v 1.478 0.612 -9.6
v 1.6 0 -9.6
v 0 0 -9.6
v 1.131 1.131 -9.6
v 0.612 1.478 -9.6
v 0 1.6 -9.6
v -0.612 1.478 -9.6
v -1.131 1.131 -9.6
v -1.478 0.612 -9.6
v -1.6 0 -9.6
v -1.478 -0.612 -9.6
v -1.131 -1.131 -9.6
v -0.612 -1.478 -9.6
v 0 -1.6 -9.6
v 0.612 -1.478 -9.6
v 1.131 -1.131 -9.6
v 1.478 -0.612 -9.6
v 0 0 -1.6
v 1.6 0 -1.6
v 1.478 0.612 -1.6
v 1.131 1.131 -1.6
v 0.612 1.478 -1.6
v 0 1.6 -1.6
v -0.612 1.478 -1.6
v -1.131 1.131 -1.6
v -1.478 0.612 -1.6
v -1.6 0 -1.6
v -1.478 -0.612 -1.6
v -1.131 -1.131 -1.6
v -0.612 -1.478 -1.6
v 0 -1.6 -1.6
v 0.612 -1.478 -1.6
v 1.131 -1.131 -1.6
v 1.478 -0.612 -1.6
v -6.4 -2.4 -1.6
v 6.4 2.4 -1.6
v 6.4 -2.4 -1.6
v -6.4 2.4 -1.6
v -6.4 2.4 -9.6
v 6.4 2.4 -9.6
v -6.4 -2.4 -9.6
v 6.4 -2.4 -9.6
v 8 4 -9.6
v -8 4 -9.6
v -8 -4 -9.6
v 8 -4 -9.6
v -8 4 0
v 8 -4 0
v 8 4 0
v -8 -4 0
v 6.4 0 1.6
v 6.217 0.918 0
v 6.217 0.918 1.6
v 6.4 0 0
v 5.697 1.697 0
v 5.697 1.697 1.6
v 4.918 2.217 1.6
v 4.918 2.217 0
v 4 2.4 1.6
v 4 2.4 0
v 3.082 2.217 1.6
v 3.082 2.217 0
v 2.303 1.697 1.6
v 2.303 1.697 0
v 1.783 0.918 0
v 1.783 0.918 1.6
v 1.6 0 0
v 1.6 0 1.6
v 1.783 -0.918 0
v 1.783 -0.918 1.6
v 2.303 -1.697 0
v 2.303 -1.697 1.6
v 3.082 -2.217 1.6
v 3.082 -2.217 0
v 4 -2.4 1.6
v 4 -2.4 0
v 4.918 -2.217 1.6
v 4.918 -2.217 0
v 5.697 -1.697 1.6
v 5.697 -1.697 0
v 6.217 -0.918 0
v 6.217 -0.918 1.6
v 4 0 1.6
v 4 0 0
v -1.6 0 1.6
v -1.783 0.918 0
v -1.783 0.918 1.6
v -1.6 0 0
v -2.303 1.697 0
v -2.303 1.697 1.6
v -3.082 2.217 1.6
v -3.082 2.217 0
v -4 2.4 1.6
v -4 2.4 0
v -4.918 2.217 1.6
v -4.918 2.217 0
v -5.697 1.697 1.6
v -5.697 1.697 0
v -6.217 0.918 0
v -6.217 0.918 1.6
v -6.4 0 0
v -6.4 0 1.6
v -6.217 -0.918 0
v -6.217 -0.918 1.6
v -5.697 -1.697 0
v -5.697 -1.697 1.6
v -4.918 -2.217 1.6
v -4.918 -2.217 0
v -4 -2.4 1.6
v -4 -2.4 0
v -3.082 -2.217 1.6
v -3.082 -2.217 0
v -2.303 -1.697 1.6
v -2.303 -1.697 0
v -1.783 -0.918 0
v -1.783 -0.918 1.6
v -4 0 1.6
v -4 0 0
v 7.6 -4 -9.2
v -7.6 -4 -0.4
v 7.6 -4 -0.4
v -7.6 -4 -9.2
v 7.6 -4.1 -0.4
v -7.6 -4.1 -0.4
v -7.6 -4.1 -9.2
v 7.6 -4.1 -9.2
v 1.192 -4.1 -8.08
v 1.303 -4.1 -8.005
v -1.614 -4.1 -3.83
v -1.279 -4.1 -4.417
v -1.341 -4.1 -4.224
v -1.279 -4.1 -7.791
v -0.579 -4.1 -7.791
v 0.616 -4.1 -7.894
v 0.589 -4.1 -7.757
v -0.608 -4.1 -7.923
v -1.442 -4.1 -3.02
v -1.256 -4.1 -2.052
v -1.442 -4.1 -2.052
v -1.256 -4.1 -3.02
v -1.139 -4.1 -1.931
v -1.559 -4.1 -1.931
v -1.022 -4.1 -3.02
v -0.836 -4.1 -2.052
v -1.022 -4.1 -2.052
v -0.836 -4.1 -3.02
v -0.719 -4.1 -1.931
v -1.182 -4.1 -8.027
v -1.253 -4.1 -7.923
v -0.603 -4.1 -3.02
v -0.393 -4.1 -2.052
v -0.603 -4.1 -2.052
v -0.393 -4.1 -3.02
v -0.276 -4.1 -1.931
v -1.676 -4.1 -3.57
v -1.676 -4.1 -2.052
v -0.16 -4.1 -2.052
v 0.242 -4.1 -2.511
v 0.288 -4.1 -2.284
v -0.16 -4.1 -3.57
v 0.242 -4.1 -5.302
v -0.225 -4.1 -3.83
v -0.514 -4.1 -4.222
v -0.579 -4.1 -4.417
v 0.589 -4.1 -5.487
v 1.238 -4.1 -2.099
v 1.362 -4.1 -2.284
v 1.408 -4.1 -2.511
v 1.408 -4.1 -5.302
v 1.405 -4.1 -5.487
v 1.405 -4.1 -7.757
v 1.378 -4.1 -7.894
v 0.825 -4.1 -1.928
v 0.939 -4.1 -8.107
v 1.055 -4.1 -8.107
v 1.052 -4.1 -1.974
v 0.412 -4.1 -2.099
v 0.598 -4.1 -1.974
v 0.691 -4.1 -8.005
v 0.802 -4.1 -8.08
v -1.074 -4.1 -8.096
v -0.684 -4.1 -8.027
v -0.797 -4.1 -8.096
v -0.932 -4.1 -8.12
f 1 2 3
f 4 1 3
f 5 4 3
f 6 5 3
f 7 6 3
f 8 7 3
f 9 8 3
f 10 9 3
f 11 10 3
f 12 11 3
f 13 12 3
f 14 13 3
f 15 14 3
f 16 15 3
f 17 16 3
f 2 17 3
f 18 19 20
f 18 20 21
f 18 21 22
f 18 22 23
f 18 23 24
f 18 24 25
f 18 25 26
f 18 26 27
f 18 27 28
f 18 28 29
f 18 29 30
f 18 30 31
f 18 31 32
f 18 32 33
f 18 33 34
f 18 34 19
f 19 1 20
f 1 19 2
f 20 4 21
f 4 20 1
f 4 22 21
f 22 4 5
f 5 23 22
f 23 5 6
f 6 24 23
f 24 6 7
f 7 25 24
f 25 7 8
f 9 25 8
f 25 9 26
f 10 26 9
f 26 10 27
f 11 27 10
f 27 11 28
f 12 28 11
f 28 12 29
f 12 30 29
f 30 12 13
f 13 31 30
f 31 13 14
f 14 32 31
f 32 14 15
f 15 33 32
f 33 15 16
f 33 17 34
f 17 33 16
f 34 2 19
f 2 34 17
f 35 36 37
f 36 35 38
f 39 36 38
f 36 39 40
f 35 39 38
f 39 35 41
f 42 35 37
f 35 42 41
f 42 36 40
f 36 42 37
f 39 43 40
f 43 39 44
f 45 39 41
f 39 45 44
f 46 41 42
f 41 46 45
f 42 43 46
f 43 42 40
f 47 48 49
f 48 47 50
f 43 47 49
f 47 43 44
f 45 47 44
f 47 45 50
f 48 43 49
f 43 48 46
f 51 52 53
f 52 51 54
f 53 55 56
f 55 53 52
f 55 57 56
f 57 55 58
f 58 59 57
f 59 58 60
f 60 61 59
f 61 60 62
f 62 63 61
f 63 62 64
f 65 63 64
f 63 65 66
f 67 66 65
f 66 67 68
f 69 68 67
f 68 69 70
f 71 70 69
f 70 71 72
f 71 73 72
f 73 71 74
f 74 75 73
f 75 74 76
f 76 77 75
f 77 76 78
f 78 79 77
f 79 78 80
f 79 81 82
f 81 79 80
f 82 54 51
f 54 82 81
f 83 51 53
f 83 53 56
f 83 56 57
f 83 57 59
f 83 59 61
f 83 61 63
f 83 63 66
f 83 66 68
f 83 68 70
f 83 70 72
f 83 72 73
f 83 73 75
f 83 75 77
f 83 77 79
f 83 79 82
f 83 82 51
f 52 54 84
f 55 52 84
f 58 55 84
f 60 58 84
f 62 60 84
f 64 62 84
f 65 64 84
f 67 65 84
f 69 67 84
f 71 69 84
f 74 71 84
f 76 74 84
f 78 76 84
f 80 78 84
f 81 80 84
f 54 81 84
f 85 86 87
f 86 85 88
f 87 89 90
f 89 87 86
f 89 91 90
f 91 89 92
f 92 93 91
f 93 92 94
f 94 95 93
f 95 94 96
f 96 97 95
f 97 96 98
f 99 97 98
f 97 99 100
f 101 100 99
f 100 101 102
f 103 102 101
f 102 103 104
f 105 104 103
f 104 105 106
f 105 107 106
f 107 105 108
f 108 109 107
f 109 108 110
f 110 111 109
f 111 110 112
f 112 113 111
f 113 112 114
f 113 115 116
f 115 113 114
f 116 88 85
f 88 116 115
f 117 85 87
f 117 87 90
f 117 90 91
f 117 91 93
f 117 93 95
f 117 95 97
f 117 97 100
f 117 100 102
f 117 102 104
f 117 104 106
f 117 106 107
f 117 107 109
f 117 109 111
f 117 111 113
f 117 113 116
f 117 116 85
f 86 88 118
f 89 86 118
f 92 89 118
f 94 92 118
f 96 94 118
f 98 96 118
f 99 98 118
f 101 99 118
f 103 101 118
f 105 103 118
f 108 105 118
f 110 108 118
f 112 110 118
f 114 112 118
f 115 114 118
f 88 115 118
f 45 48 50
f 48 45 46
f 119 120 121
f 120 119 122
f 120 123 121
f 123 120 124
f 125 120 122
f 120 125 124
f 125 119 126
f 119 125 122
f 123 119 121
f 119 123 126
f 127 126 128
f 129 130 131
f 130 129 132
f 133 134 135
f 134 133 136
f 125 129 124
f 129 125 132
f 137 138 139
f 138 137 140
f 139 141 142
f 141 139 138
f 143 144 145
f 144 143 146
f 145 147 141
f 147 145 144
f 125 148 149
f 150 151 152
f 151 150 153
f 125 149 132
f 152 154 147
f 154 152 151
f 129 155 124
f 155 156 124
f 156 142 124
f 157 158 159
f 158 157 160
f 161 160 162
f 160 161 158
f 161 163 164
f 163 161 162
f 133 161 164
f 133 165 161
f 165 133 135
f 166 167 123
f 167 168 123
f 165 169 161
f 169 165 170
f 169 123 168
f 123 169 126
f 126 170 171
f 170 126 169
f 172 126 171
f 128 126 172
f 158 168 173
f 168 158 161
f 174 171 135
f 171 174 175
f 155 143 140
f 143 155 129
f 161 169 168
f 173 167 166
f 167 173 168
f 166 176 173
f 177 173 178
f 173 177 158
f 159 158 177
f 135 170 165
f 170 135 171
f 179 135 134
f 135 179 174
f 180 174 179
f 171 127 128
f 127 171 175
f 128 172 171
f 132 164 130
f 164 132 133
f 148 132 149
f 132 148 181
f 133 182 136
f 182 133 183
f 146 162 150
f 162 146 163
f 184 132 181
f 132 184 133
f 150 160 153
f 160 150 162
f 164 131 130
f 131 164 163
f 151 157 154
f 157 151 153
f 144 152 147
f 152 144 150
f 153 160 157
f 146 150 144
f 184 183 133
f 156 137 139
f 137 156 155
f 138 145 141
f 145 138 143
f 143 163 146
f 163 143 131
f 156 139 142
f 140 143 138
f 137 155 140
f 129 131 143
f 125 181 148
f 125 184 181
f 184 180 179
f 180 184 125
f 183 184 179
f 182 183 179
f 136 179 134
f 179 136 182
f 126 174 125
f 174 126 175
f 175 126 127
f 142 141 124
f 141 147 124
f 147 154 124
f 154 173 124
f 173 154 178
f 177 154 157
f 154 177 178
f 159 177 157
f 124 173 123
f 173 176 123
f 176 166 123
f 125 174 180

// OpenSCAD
// file: ../p/4-4edge.scad
use <../lib.scad>
function ldraw_lib__4_4edge() = [
// 0 Circle 1.0
// 0 Name: 4-4edge.dat
// 0 Author: James Jessiman
// 0 !LDRAW_ORG Primitive UPDATE 2017-01
// 0 !LICENSE Licensed under CC BY 2.0 and CC BY 4.0 : see CAreadme.txt
// 
// 0 BFC CERTIFY CCW
  [0,"BFC","CERTIFY"],
  [0,"BFC","CCW"],
// 
// 0 !HISTORY 1998-12-15 [PTadmin] Official Update 1998-10
// 0 !HISTORY 2005-12-28 [PTadmin] Official Update 2005-01
// 0 !HISTORY 2007-06-24 [PTadmin] Header formatted for Contributor Agreement
// 0 !HISTORY 2008-07-01 [PTadmin] Official Update 2008-01
// 0 !HISTORY 2017-01-15 [Steffen] BFCed
// 0 !HISTORY 2017-12-30 [PTadmin] Official Update 2017-01
// 
// 
// 2 24 1 0 0 0.9239 0 0.3827
  [2,24,1,0,0,0.9239,0,0.3827],
// 2 24 0.9239 0 0.3827 0.7071 0 0.7071
  [2,24,0.9239,0,0.3827,0.7071,0,0.7071],
// 2 24 0.7071 0 0.7071 0.3827 0 0.9239
  [2,24,0.7071,0,0.7071,0.3827,0,0.9239],
// 2 24 0.3827 0 0.9239 0 0 1
  [2,24,0.3827,0,0.9239,0,0,1],
// 2 24 0 0 1 -0.3827 0 0.9239
  [2,24,0,0,1,-0.3827,0,0.9239],
// 2 24 -0.3827 0 0.9239 -0.7071 0 0.7071
  [2,24,-0.3827,0,0.9239,-0.7071,0,0.7071],
// 2 24 -0.7071 0 0.7071 -0.9239 0 0.3827
  [2,24,-0.7071,0,0.7071,-0.9239,0,0.3827],
// 2 24 -0.9239 0 0.3827 -1 0 -0
  [2,24,-0.9239,0,0.3827,-1,0,-0],
// 2 24 -1 0 -0 -0.9239 0 -0.3827
  [2,24,-1,0,-0,-0.9239,0,-0.3827],
// 2 24 -0.9239 0 -0.3827 -0.7071 0 -0.7071
  [2,24,-0.9239,0,-0.3827,-0.7071,0,-0.7071],
// 2 24 -0.7071 0 -0.7071 -0.3827 0 -0.9239
  [2,24,-0.7071,0,-0.7071,-0.3827,0,-0.9239],
// 2 24 -0.3827 0 -0.9239 0 0 -1
  [2,24,-0.3827,0,-0.9239,0,0,-1],
// 2 24 0 0 -1 0.3827 0 -0.9239
  [2,24,0,0,-1,0.3827,0,-0.9239],
// 2 24 0.3827 0 -0.9239 0.7071 0 -0.7071
  [2,24,0.3827,0,-0.9239,0.7071,0,-0.7071],
// 2 24 0.7071 0 -0.7071 0.9239 0 -0.3827
  [2,24,0.7071,0,-0.7071,0.9239,0,-0.3827],
// 2 24 0.9239 0 -0.3827 1 0 0
  [2,24,0.9239,0,-0.3827,1,0,0],
];
module ldraw_lib__4_4edge(step=0, col=false, unit=2/5, alt=false, line=0.2, solid=!$preview)
    makepoly(ldraw_lib__4_4edge(), step=step, col=col, unit=unit, alt=alt, line=line, solid=solid);
ldraw_lib__4_4edge(line=0.2);
// file: ../p/4-4disc.scad
use <../lib.scad>
function ldraw_lib__4_4disc() = [
// 0 Disc 1.0
// 0 Name: 4-4disc.dat
// 0 Author: James Jessiman
// 0 !LDRAW_ORG Primitive UPDATE 2002-02
// 0 !LICENSE Licensed under CC BY 2.0 and CC BY 4.0 : see CAreadme.txt
// 
// 0 BFC CERTIFY CCW
  [0,"BFC","CERTIFY"],
  [0,"BFC","CCW"],
// 
// 0 !HISTORY 1998-12-15 [PTadmin] Official Update 1998-10
// 0 !HISTORY 2002-03-23 [sbliss] Added BFC statement
// 0 !HISTORY 2002-04-25 [PTadmin] Official Update 2002-02
// 0 !HISTORY 2007-06-24 [PTadmin] Header formatted for Contributor Agreement
// 0 !HISTORY 2008-07-01 [PTadmin] Official Update 2008-01
// 
// 
// 3 16 0 0 0 1 0 0 0.9239 0 0.3827
  [3,16,0,0,0,1,0,0,0.9239,0,0.3827],
// 3 16 0 0 0 0.9239 0 0.3827 0.7071 0 0.7071
  [3,16,0,0,0,0.9239,0,0.3827,0.7071,0,0.7071],
// 3 16 0 0 0 0.7071 0 0.7071 0.3827 0 0.9239
  [3,16,0,0,0,0.7071,0,0.7071,0.3827,0,0.9239],
// 3 16 0 0 0 0.3827 0 0.9239 0 0 1
  [3,16,0,0,0,0.3827,0,0.9239,0,0,1],
// 3 16 0 0 0 0 0 1 -0.3827 0 0.9239
  [3,16,0,0,0,0,0,1,-0.3827,0,0.9239],
// 3 16 0 0 0 -0.3827 0 0.9239 -0.7071 0 0.7071
  [3,16,0,0,0,-0.3827,0,0.9239,-0.7071,0,0.7071],
// 3 16 0 0 0 -0.7071 0 0.7071 -0.9239 0 0.3827
  [3,16,0,0,0,-0.7071,0,0.7071,-0.9239,0,0.3827],
// 3 16 0 0 0 -0.9239 0 0.3827 -1 0 -0
  [3,16,0,0,0,-0.9239,0,0.3827,-1,0,-0],
// 3 16 0 0 0 -1 0 -0 -0.9239 0 -0.3827
  [3,16,0,0,0,-1,0,-0,-0.9239,0,-0.3827],
// 3 16 0 0 0 -0.9239 0 -0.3827 -0.7071 0 -0.7071
  [3,16,0,0,0,-0.9239,0,-0.3827,-0.7071,0,-0.7071],
// 3 16 0 0 0 -0.7071 0 -0.7071 -0.3827 0 -0.9239
  [3,16,0,0,0,-0.7071,0,-0.7071,-0.3827,0,-0.9239],
// 3 16 0 0 0 -0.3827 0 -0.9239 0 0 -1
  [3,16,0,0,0,-0.3827,0,-0.9239,0,0,-1],
// 3 16 0 0 0 0 0 -1 0.3827 0 -0.9239
  [3,16,0,0,0,0,0,-1,0.3827,0,-0.9239],
// 3 16 0 0 0 0.3827 0 -0.9239 0.7071 0 -0.7071
  [3,16,0,0,0,0.3827,0,-0.9239,0.7071,0,-0.7071],
// 3 16 0 0 0 0.7071 0 -0.7071 0.9239 0 -0.3827
  [3,16,0,0,0,0.7071,0,-0.7071,0.9239,0,-0.3827],
// 3 16 0 0 0 0.9239 0 -0.3827 1 0 0
  [3,16,0,0,0,0.9239,0,-0.3827,1,0,0],
// 0
];
module ldraw_lib__4_4disc(step=0, col=false, unit=2/5, alt=false, line=0.2, solid=!$preview)
    makepoly(ldraw_lib__4_4disc(), step=step, col=col, unit=unit, alt=alt, line=line, solid=solid);
ldraw_lib__4_4disc(line=0.2);
// file: ../p/4-4cyli.scad
use <../lib.scad>
$fa=1; $fs=0.2;
function ldraw_lib__4_4cyli(realsolid=false) = [
// 0 Cylinder 1.0
// 0 Name: 4-4cyli.dat
// 0 Author: James Jessiman
// 0 !LDRAW_ORG Primitive UPDATE 2005-01
// 0 !LICENSE Licensed under CC BY 2.0 and CC BY 4.0 : see CAreadme.txt
// 
// 0 BFC CERTIFY CCW
  [0,"BFC","CERTIFY"],
  [0,"BFC","CCW"],
// 
// 0 !HISTORY 1998-12-15 [PTadmin] Official Update 1998-10
// 0 !HISTORY 2002-03-23 [sbliss] Added BFC statement; merged headers from files in distributions LDraw 0.27 and Complete.
// 0 !HISTORY 2002-04-25 [PTadmin] Official Update 2002-02
// 0 !HISTORY 2004-12-14 [guyvivan] BFC CCW
// 0 !HISTORY 2005-12-28 [PTadmin] Official Update 2005-01
// 0 !HISTORY 2007-06-24 [PTadmin] Header formatted for Contributor Agreement
// 0 !HISTORY 2008-07-01 [PTadmin] Official Update 2008-01
// 
// 
// 4 16 1 1 0 0.9239 1 0.3827 0.9239 0 0.3827 1 0 0
  [4,16,1,1,0,0.9239,1,0.3827,0.9239,0,0.3827,1,0,0],
// 5 24 1 0 0 1 1 0 0.9239 0 0.3827 0.9239 0 -0.3827
  [5,24,1,0,0,1,1,0,0.9239,0,0.3827,0.9239,0,-0.3827],
// 4 16 0.9239 1 0.3827 0.7071 1 0.7071 0.7071 0 0.7071 0.9239 0 0.3827
  [4,16,0.9239,1,0.3827,0.7071,1,0.7071,0.7071,0,0.7071,0.9239,0,0.3827],
// 5 24 0.9239 0 0.3827 0.9239 1 0.3827 0.7071 0 0.7071 1 0 0
  [5,24,0.9239,0,0.3827,0.9239,1,0.3827,0.7071,0,0.7071,1,0,0],
// 4 16 0.7071 1 0.7071 0.3827 1 0.9239 0.3827 0 0.9239 0.7071 0 0.7071
  [4,16,0.7071,1,0.7071,0.3827,1,0.9239,0.3827,0,0.9239,0.7071,0,0.7071],
// 5 24 0.7071 0 0.7071 0.7071 1 0.7071 0.3827 0 0.9239 0.9239 0 0.3827
  [5,24,0.7071,0,0.7071,0.7071,1,0.7071,0.3827,0,0.9239,0.9239,0,0.3827],
// 4 16 0.3827 1 0.9239 0 1 1 0 0 1 0.3827 0 0.9239
  [4,16,0.3827,1,0.9239,0,1,1,0,0,1,0.3827,0,0.9239],
// 5 24 0.3827 0 0.9239 0.3827 1 0.9239 0 0 1 0.7071 0 0.7071
  [5,24,0.3827,0,0.9239,0.3827,1,0.9239,0,0,1,0.7071,0,0.7071],
// 4 16 0 1 1 -0.3827 1 0.9239 -0.3827 0 0.9239 0 0 1
  [4,16,0,1,1,-0.3827,1,0.9239,-0.3827,0,0.9239,0,0,1],
// 5 24 0 0 1 0 1 1 -0.3827 0 0.9239 0.3827 0 0.9239
  [5,24,0,0,1,0,1,1,-0.3827,0,0.9239,0.3827,0,0.9239],
// 4 16 -0.3827 1 0.9239 -0.7071 1 0.7071 -0.7071 0 0.7071 -0.3827 0 0.9239
  [4,16,-0.3827,1,0.9239,-0.7071,1,0.7071,-0.7071,0,0.7071,-0.3827,0,0.9239],
// 5 24 -0.3827 0 0.9239 -0.3827 1 0.9239 -0.7071 0 0.7071 0 0 1
  [5,24,-0.3827,0,0.9239,-0.3827,1,0.9239,-0.7071,0,0.7071,0,0,1],
// 4 16 -0.7071 1 0.7071 -0.9239 1 0.3827 -0.9239 0 0.3827 -0.7071 0 0.7071
  [4,16,-0.7071,1,0.7071,-0.9239,1,0.3827,-0.9239,0,0.3827,-0.7071,0,0.7071],
// 5 24 -0.7071 0 0.7071 -0.7071 1 0.7071 -0.9239 0 0.3827 -0.3827 0 0.9239
  [5,24,-0.7071,0,0.7071,-0.7071,1,0.7071,-0.9239,0,0.3827,-0.3827,0,0.9239],
// 4 16 -0.9239 1 0.3827 -1 1 0 -1 0 0 -0.9239 0 0.3827
  [4,16,-0.9239,1,0.3827,-1,1,0,-1,0,0,-0.9239,0,0.3827],
// 5 24 -0.9239 0 0.3827 -0.9239 1 0.3827 -1 0 0 -0.7071 0 0.7071
  [5,24,-0.9239,0,0.3827,-0.9239,1,0.3827,-1,0,0,-0.7071,0,0.7071],
// 4 16 -1 1 0 -0.9239 1 -0.3827 -0.9239 0 -0.3827 -1 0 0
  [4,16,-1,1,0,-0.9239,1,-0.3827,-0.9239,0,-0.3827,-1,0,0],
// 5 24 -1 0 0 -1 1 0 -0.9239 0 -0.3827 -0.9239 0 0.3827
  [5,24,-1,0,0,-1,1,0,-0.9239,0,-0.3827,-0.9239,0,0.3827],
// 4 16 -0.9239 1 -0.3827 -0.7071 1 -0.7071 -0.7071 0 -0.7071 -0.9239 0 -0.3827
  [4,16,-0.9239,1,-0.3827,-0.7071,1,-0.7071,-0.7071,0,-0.7071,-0.9239,0,-0.3827],
// 5 24 -0.9239 0 -0.3827 -0.9239 1 -0.3827 -0.7071 0 -0.7071 -1 0 0
  [5,24,-0.9239,0,-0.3827,-0.9239,1,-0.3827,-0.7071,0,-0.7071,-1,0,0],
// 4 16 -0.7071 1 -0.7071 -0.3827 1 -0.9239 -0.3827 0 -0.9239 -0.7071 0 -0.7071
  [4,16,-0.7071,1,-0.7071,-0.3827,1,-0.9239,-0.3827,0,-0.9239,-0.7071,0,-0.7071],
// 5 24 -0.7071 0 -0.7071 -0.7071 1 -0.7071 -0.3827 0 -0.9239 -0.9239 0 -0.3827
  [5,24,-0.7071,0,-0.7071,-0.7071,1,-0.7071,-0.3827,0,-0.9239,-0.9239,0,-0.3827],
// 4 16 -0.3827 1 -0.9239 0 1 -1 0 0 -1 -0.3827 0 -0.9239
  [4,16,-0.3827,1,-0.9239,0,1,-1,0,0,-1,-0.3827,0,-0.9239],
// 5 24 -0.3827 0 -0.9239 -0.3827 1 -0.9239 0 0 -1 -0.7071 0 -0.7071
  [5,24,-0.3827,0,-0.9239,-0.3827,1,-0.9239,0,0,-1,-0.7071,0,-0.7071],
// 4 16 0 1 -1 0.3827 1 -0.9239 0.3827 0 -0.9239 0 0 -1
  [4,16,0,1,-1,0.3827,1,-0.9239,0.3827,0,-0.9239,0,0,-1],
// 5 24 0 0 -1 0 1 -1 0.3827 0 -0.9239 -0.3827 0 -0.9239
  [5,24,0,0,-1,0,1,-1,0.3827,0,-0.9239,-0.3827,0,-0.9239],
// 4 16 0.3827 1 -0.9239 0.7071 1 -0.7071 0.7071 0 -0.7071 0.3827 0 -0.9239
  [4,16,0.3827,1,-0.9239,0.7071,1,-0.7071,0.7071,0,-0.7071,0.3827,0,-0.9239],
// 5 24 0.3827 0 -0.9239 0.3827 1 -0.9239 0.7071 0 -0.7071 0 0 -1
  [5,24,0.3827,0,-0.9239,0.3827,1,-0.9239,0.7071,0,-0.7071,0,0,-1],
// 4 16 0.7071 1 -0.7071 0.9239 1 -0.3827 0.9239 0 -0.3827 0.7071 0 -0.7071
  [4,16,0.7071,1,-0.7071,0.9239,1,-0.3827,0.9239,0,-0.3827,0.7071,0,-0.7071],
// 5 24 0.7071 0 -0.7071 0.7071 1 -0.7071 0.9239 0 -0.3827 0.3827 0 -0.9239
  [5,24,0.7071,0,-0.7071,0.7071,1,-0.7071,0.9239,0,-0.3827,0.3827,0,-0.9239],
// 4 16 0.9239 1 -0.3827 1 1 0 1 0 0 0.9239 0 -0.3827
  [4,16,0.9239,1,-0.3827,1,1,0,1,0,0,0.9239,0,-0.3827],
// 5 24 0.9239 0 -0.3827 0.9239 1 -0.3827 1 0 0 0.7071 0 -0.7071
  [5,24,0.9239,0,-0.3827,0.9239,1,-0.3827,1,0,0,0.7071,0,-0.7071],
// 0
];
module ldraw_lib__4_4cyli(step=0, col=false, unit=2/5, alt=false, line=0.2, solid=!$preview)
    makepoly(ldraw_lib__4_4cyli(solid), step=step, col=col, unit=unit, alt=alt, line=line, solid=solid);
ldraw_lib__4_4cyli(line=0.2);
// file: ../p/stud3.scad
use <../lib.scad>
use <4-4cyli.scad>
use <4-4disc.scad>
use <4-4edge.scad>
function ldraw_lib__stud3() = [
// 0 Stud Tube Solid
// 0 Name: stud3.dat
// 0 Author: James Jessiman
// 0 !LDRAW_ORG Primitive UPDATE 2012-01
// 0 !LICENSE Licensed under CC BY 4.0 : see CAreadme.txt
// 
// 0 BFC CERTIFY CCW
  [0,"BFC","CERTIFY"],
  [0,"BFC","CCW"],
// 
// 0 !HISTORY 2002-04-04 [sbliss] Modified for BFC compliance
// 0 !HISTORY 2002-04-25 [PTadmin] Official Update 2002-02
// 0 !HISTORY 2007-06-24 [PTadmin] Header formatted for Contributor Agreement
// 0 !HISTORY 2008-07-01 [PTadmin] Official Update 2008-01
// 0 !HISTORY 2012-02-16 [Philo] Changed to CCW
// 0 !HISTORY 2012-03-30 [PTadmin] Official Update 2012-01
// 
// 
// 1 16 0 -4 0 4 0 0 0 1 0 0 0 4 4-4edge.dat
  [1,16,0,-4,0,4,0,0,0,1,0,0,0,4, ldraw_lib__4_4edge()],
// 1 16 0 0 0 4 0 0 0 1 0 0 0 4 4-4edge.dat
  [1,16,0,0,0,4,0,0,0,1,0,0,0,4, ldraw_lib__4_4edge()],
// 1 16 0 -4 0 4 0 0 0 1 0 0 0 4 4-4disc.dat
  [1,16,0,-4,0,4,0,0,0,1,0,0,0,4, ldraw_lib__4_4disc()],
  [-1,16,0,0,0,4,0,0,0,-1,0,0,0,4, ldraw_lib__4_4disc()],
// 1 16 0 -4 0 4 0 0 0 4 0 0 0 4 4-4cyli.dat
  [1,16,0,-4,0,4,0,0,0,4,0,0,0,4, ldraw_lib__4_4cyli()],
];
module ldraw_lib__stud3(step=0, col=false, unit=2/5, alt=false, line=0.2, solid=!$preview)
    makepoly(ldraw_lib__stud3(), step=step, col=col, unit=unit, alt=alt, line=line, solid=solid);
ldraw_lib__stud3(line=0.2);
// file: ../p/stud.scad
use <../lib.scad>
use <4-4cyli.scad>
use <4-4disc.scad>
use <4-4edge.scad>
function ldraw_lib__stud() = [
// 0 Stud
// 0 Name: stud.dat
// 0 Author: James Jessiman
// 0 !LDRAW_ORG Primitive UPDATE 2012-01
// 0 !LICENSE Licensed under CC BY 4.0 : see CAreadme.txt
// 
// 0 BFC CERTIFY CCW
  [0,"BFC","CERTIFY"],
  [0,"BFC","CCW"],
// 
// 0 !HISTORY 2002-04-04 [sbliss] Modified for BFC compliance
// 0 !HISTORY 2002-04-25 [PTadmin] Official Update 2002-02
// 0 !HISTORY 2007-06-24 [PTadmin] Header formatted for Contributor Agreement
// 0 !HISTORY 2008-07-01 [PTadmin] Official Update 2008-01
// 0 !HISTORY 2012-02-16 [Philo] Changed to CCW
// 0 !HISTORY 2012-03-30 [PTadmin] Official Update 2012-01
// 
// 
// 1 16 0 0 0 6 0 0 0 1 0 0 0 6 4-4edge.dat
  [1,16,0,0,0,6,0,0,0,1,0,0,0,6, ldraw_lib__4_4edge()],
// 1 16 0 -4 0 6 0 0 0 1 0 0 0 6 4-4edge.dat
  [1,16,0,-4,0,6,0,0,0,1,0,0,0,6, ldraw_lib__4_4edge()],
// 1 16 0 0 0 6 0 0 0 -4 0 0 0 6 4-4cyli.dat
  [1,16,0,0,0,6,0,0,0,-4,0,0,0,6, ldraw_lib__4_4cyli()],
// 1 16 0 -4 0 6 0 0 0 1 0 0 0 6 4-4disc.dat
  [1,16,0,-4,0,6,0,0,0,1,0,0,0,6, ldraw_lib__4_4disc()],
  [-1,16,0,0,0,6,0,0,0,-1,0,0,0,6, ldraw_lib__4_4disc()],
];
module ldraw_lib__stud(step=0, col=false, unit=2/5, alt=false, line=0.2, solid=!$preview)
    makepoly(ldraw_lib__stud(), step=step, col=col, unit=unit, alt=alt, line=line, solid=solid);
ldraw_lib__stud(line=0.2);
// file: ../p/box5.scad
use <../lib.scad>
function ldraw_lib__box5() = [
// 0 Box with 5 Faces and All Edges
// 0 Name: box5.dat
// 0 Author: James Jessiman
// 0 !LDRAW_ORG Primitive UPDATE 2012-01
// 0 !LICENSE Licensed under CC BY 2.0 and CC BY 4.0 : see CAreadme.txt
// 
// 0 BFC CERTIFY CCW
  [0,"BFC","CERTIFY"],
  [0,"BFC","CCW"],
// 
// 0 !HISTORY 2002-04-03 [sbliss] Modified for BFC compliance
// 0 !HISTORY 2002-04-25 [PTadmin] Official Update 2002-02
// 0 !HISTORY 2007-06-24 [PTadmin] Header formatted for Contributor Agreement
// 0 !HISTORY 2008-07-01 [PTadmin] Official Update 2008-01
// 0 !HISTORY 2012-02-16 [Philo] Changed to CCW
// 0 !HISTORY 2012-03-30 [PTadmin] Official Update 2012-01
// 
// 
// 2 24 1 1 1 -1 1 1
  [2,24,1,1,1,-1,1,1],
// 2 24 -1 1 1 -1 1 -1
  [2,24,-1,1,1,-1,1,-1],
// 2 24 -1 1 -1 1 1 -1
  [2,24,-1,1,-1,1,1,-1],
// 2 24 1 1 -1 1 1 1
  [2,24,1,1,-1,1,1,1],
// 2 24 1 0 1 -1 0 1
  [2,24,1,0,1,-1,0,1],
// 2 24 -1 0 1 -1 0 -1
  [2,24,-1,0,1,-1,0,-1],
// 2 24 -1 0 -1 1 0 -1
  [2,24,-1,0,-1,1,0,-1],
// 2 24 1 0 -1 1 0 1
  [2,24,1,0,-1,1,0,1],
// 2 24 1 0 1 1 1 1
  [2,24,1,0,1,1,1,1],
// 2 24 -1 0 1 -1 1 1
  [2,24,-1,0,1,-1,1,1],
// 2 24 1 0 -1 1 1 -1
  [2,24,1,0,-1,1,1,-1],
// 2 24 -1 0 -1 -1 1 -1
  [2,24,-1,0,-1,-1,1,-1],
// 4 16 -1 1 1 1 1 1 1 1 -1 -1 1 -1
  [4,16,-1,1,1,1,1,1,1,1,-1,-1,1,-1],
// 4 16 -1 1 1 -1 0 1 1 0 1 1 1 1
  [4,16,-1,1,1,-1,0,1,1,0,1,1,1,1],
// 4 16 -1 1 -1 -1 0 -1 -1 0 1 -1 1 1
  [4,16,-1,1,-1,-1,0,-1,-1,0,1,-1,1,1],
// 4 16 1 1 -1 1 0 -1 -1 0 -1 -1 1 -1
  [4,16,1,1,-1,1,0,-1,-1,0,-1,-1,1,-1],
// 4 16 1 1 1 1 0 1 1 0 -1 1 1 -1
  [4,16,1,1,1,1,0,1,1,0,-1,1,1,-1],
];
makepoly(ldraw_lib__box5(), line=0.2);
// file: ../p/box4t.scad
use <../lib.scad>
function ldraw_lib__box4t() = [
// 0 Box with 4 Adjacent Faces and All Edges
// 0 Name: box4t.dat
// 0 Author: Tore Eriksson [Tore_Eriksson]
// 0 !LDRAW_ORG Primitive UPDATE 2003-02
// 0 !LICENSE Licensed under CC BY 2.0 and CC BY 4.0 : see CAreadme.txt
// 
// 0 BFC CERTIFY CCW
  [0,"BFC","CERTIFY"],
  [0,"BFC","CCW"],
// 
// 0 !HISTORY 1997-09-29 [PTadmin] Official Update 1997-15
// 0 !HISTORY 2002-08-31 [izanette] Modified with WINDZ for BFC compliance
// 0 !HISTORY 2003-08-01 [PTadmin] Official Update 2003-02
// 0 !HISTORY 2007-06-24 [PTadmin] Header formatted for Contributor Agreement
// 0 !HISTORY 2008-07-01 [PTadmin] Official Update 2008-01
// 
// 
// 2 24 1 1 1 -1 1 1
  [2,24,1,1,1,-1,1,1],
// 2 24 -1 1 1 -1 1 -1
  [2,24,-1,1,1,-1,1,-1],
// 2 24 -1 1 -1 1 1 -1
  [2,24,-1,1,-1,1,1,-1],
// 2 24 1 1 -1 1 1 1
  [2,24,1,1,-1,1,1,1],
// 2 24 1 0 1 -1 0 1
  [2,24,1,0,1,-1,0,1],
// 2 24 -1 0 1 -1 0 -1
  [2,24,-1,0,1,-1,0,-1],
// 2 24 -1 0 -1 1 0 -1
  [2,24,-1,0,-1,1,0,-1],
// 2 24 1 0 -1 1 0 1
  [2,24,1,0,-1,1,0,1],
// 2 24 1 0 1 1 1 1
  [2,24,1,0,1,1,1,1],
// 2 24 -1 0 1 -1 1 1
  [2,24,-1,0,1,-1,1,1],
// 2 24 1 0 -1 1 1 -1
  [2,24,1,0,-1,1,1,-1],
// 2 24 -1 0 -1 -1 1 -1
  [2,24,-1,0,-1,-1,1,-1],
// 4 16 1 1 1 1 1 -1 -1 1 -1 -1 1 1
  [4,16,1,1,1,1,1,-1,-1,1,-1,-1,1,1],
// 4 16 1 1 1 -1 1 1 -1 0 1 1 0 1
  [4,16,1,1,1,-1,1,1,-1,0,1,1,0,1],
// 4 16 -1 1 1 -1 1 -1 -1 0 -1 -1 0 1
  [4,16,-1,1,1,-1,1,-1,-1,0,-1,-1,0,1],
// 0 4 16 -1 1 -1 -1 0 -1 1 0 -1 1 1 -1
// 4 16 1 1 -1 1 1 1 1 0 1 1 0 -1
  [4,16,1,1,-1,1,1,1,1,0,1,1,0,-1],
// 0
];
makepoly(ldraw_lib__box4t(), line=0.2);
// file: s/3004s01.scad
use <../../lib.scad>
use <../../p/box4t.scad>
use <../../p/box5.scad>
use <../../p/stud.scad>
use <../../p/stud3.scad>
$fa=1; $fs=0.2;
function ldraw_lib__s__3004s01(realsolid=false) = [
// 0 ~Brick  1 x  2 without Front Face
// 0 Name: s\3004s01.dat
// 0 Author: James Jessiman
// 0 !LDRAW_ORG Subpart UPDATE 2003-03
// 0 !LICENSE Licensed under CC BY 2.0 and CC BY 4.0 : see CAreadme.txt
// 
// 0 BFC CERTIFY CCW
  [0,"BFC","CERTIFY"],
  [0,"BFC","CCW"],
// 
// 0 !HISTORY 2003-09-07 [jriley] Subfiling, BFC
// 0 !HISTORY 2003-12-19 [PTadmin] Official Update 2003-03
// 0 !HISTORY 2007-08-29 [PTadmin] Header formatted for Contributor Agreement
// 0 !HISTORY 2008-07-01 [PTadmin] Official Update 2008-01
// 
// 
// 1 16 0 4 0 1 0 0 0 -5 0 0 0 1 stud3.dat
  [1,16,0,4,0,1,0,0,0,-5,0,0,0,1, ldraw_lib__stud3(realsolid)],
// 0 BFC INVERTNEXT
  [0,"BFC","INVERTNEXT"],
// 1 16 0 24 0 16 0 0 0 -20 0 0 0 6 box5.dat
  [1,16,0,24,0,16,0,0,0,-20,0,0,0,6, ldraw_lib__box5(realsolid)],
// 4 16 20 24 10 16 24 6 -16 24 6 -20 24 10
  [4,16,20,24,10,16,24,6,-16,24,6,-20,24,10],
// 4 16 -20 24 10 -16 24 6 -16 24 -6 -20 24 -10
  [4,16,-20,24,10,-16,24,6,-16,24,-6,-20,24,-10],
// 4 16 -20 24 -10 -16 24 -6 16 24 -6 20 24 -10
  [4,16,-20,24,-10,-16,24,-6,16,24,-6,20,24,-10],
// 4 16 20 24 -10 16 24 -6 16 24 6 20 24 10
  [4,16,20,24,-10,16,24,-6,16,24,6,20,24,10],
// 1 16 0 24 0 20 0 0 0 -24 0 0 0 10 box4t.dat
  [1,16,0,24,0,20,0,0,0,-24,0,0,0,10, ldraw_lib__box4t(realsolid)],
// 1 16 10 0 0 1 0 0 0 1 0 0 0 1 stud.dat
  [1,16,10,0,0,1,0,0,0,1,0,0,0,1, ldraw_lib__stud(realsolid)],
// 1 16 -10 0 0 1 0 0 0 1 0 0 0 1 stud.dat
  [1,16,-10,0,0,1,0,0,0,1,0,0,0,1, ldraw_lib__stud(realsolid)],
// 0
];
module ldraw_lib__s__3004s01(step=0, col=false, unit=2/5, alt=false, line=0.2, solid=!$preview)
    makepoly(ldraw_lib__s__3004s01(solid), step=step, col=col, unit=unit, alt=alt, line=line, solid=solid);
ldraw_lib__s__3004s01(line=0.2);
// file: ../p/box5-12.scad
use <../lib.scad>
function ldraw_lib__box5_12() = [
// 0 Box with 5 Faces without Any Edges
// 0 Name: box5-12.dat
// 0 Author: Chris Dee [cwdee]
// 0 !LDRAW_ORG Primitive UPDATE 2009-02
// 0 !LICENSE Licensed under CC BY 2.0 and CC BY 4.0 : see CAreadme.txt
// 
// 0 BFC CERTIFY CCW
  [0,"BFC","CERTIFY"],
  [0,"BFC","CCW"],
// 
// 0 !HISTORY 2009-09-03 [PTadmin] Official Update 2009-02
// 
// 
// 4 16 1 1 1 1 1 -1 -1 1 -1 -1 1 1
  [4,16,1,1,1,1,1,-1,-1,1,-1,-1,1,1],
// 4 16 -1 0 1 1 0 1 1 1 1 -1 1 1
  [4,16,-1,0,1,1,0,1,1,1,1,-1,1,1],
// 4 16 -1 0 -1 -1 0 1 -1 1 1 -1 1 -1
  [4,16,-1,0,-1,-1,0,1,-1,1,1,-1,1,-1],
// 4 16 1 0 -1 -1 0 -1 -1 1 -1 1 1 -1
  [4,16,1,0,-1,-1,0,-1,-1,1,-1,1,1,-1],
// 4 16 1 0 1 1 0 -1 1 1 -1 1 1 1
  [4,16,1,0,1,1,0,-1,1,1,-1,1,1,1],
// 0
];
module ldraw_lib__box5_12(step=0, col=false, unit=2/5, alt=false, line=0.2, solid=!$preview)
    makepoly(ldraw_lib__box5_12(), step=step, col=col, unit=unit, alt=alt, line=line, solid=solid);
ldraw_lib__box5_12(line=0.2);
// file: 3004.scad
use <../lib.scad>
use <s/3004s01.scad>
function ldraw_lib__3004() = [
// 0 Brick  1 x  2
// 0 Name: 3004.dat
// 0 Author: James Jessiman
// 0 !LDRAW_ORG Part UPDATE 2022-05
// 0 !LICENSE Licensed under CC BY 2.0 and CC BY 4.0 : see CAreadme.txt
// 
// 0 BFC CERTIFY CCW
  [0,"BFC","CERTIFY"],
  [0,"BFC","CCW"],
// 
// 0 !HISTORY 2001-10-26 [PTadmin] Official Update 2001-01
// 0 !HISTORY 2002-05-07 {unknown} BFC Certification
// 0 !HISTORY 2002-06-11 [PTadmin] Official Update 2002-03
// 0 !HISTORY 2007-05-07 [PTadmin] Header formatted for Contributor Agreement
// 0 !HISTORY 2008-07-01 [PTadmin] Official Update 2008-01
// 0 !HISTORY 2022-08-04 [MagFors] Using subfile
// 0 !HISTORY 2022-09-15 [PTadmin] Official Update 2022-05
// 
// 
// 1 16 0 0 0 1 0 0 0 1 0 0 0 1 s\3004s01.dat
  [1,16,0,0,0,1,0,0,0,1,0,0,0,1, ldraw_lib__s__3004s01()],
// 4 16 -20 24 -10 20 24 -10 20 0 -10 -20 0 -10
  [4,16,-20,24,-10,20,24,-10,20,0,-10,-20,0,-10],
];
module ldraw_lib__3004(step=0, col=false, unit=2/5, alt=false, line=0.2, solid=!$preview)
    makepoly(ldraw_lib__3004(), step=step, col=col, unit=unit, alt=alt, line=line, solid=solid);
ldraw_lib__3004(line=0.2);
// main file
use <../lib.scad>
use <164565d.scad>
use <3004.scad>
function ldraw_lib__3004d11() = [
// 0 Brick  1 x  2 with Blue Fork and Knife Sticker
// 0 Name: 3004d11.dat
// 0 Author: Takeshi Takahashi [RainbowDolphin]
// 0 !LDRAW_ORG Shortcut UPDATE 2024-07
// 0 !LICENSE Licensed under CC BY 4.0 : see CAreadme.txt
// 
// 0 BFC CERTIFY CCW
  [0,"BFC","CERTIFY"],
  [0,"BFC","CCW"],
// 
// 0 !CATEGORY Sticker Shortcut
// 0 !KEYWORDS Bricklink 3004pb013, Dining car, set 10001, Set 4558, Train
// 
// 0 !HISTORY 2024-08-26 [OrionP] Official Update 2024-07
// 
// 1 16 0 0 0 1 0 0 0 1 0 0 0 1 3004.dat
  [1,16,0,0,0,1,0,0,0,1,0,0,0,1, ldraw_lib__3004()],
// 1 16 0 12 -10 1 0 0 0 0 -1 0 1 0 164565d.dat
  [1,16,0,12,-10,1,0,0,0,0,-1,0,1,0, ldraw_lib__164565d()],
];
module ldraw_lib__3004d11(step=0, col=false, unit=2/5, alt=false, line=0.2, solid=!$preview)
    makepoly(ldraw_lib__3004d11(), step=step, col=col, unit=unit, alt=alt, line=line, solid=solid);
ldraw_lib__3004d11(line=0.2);
